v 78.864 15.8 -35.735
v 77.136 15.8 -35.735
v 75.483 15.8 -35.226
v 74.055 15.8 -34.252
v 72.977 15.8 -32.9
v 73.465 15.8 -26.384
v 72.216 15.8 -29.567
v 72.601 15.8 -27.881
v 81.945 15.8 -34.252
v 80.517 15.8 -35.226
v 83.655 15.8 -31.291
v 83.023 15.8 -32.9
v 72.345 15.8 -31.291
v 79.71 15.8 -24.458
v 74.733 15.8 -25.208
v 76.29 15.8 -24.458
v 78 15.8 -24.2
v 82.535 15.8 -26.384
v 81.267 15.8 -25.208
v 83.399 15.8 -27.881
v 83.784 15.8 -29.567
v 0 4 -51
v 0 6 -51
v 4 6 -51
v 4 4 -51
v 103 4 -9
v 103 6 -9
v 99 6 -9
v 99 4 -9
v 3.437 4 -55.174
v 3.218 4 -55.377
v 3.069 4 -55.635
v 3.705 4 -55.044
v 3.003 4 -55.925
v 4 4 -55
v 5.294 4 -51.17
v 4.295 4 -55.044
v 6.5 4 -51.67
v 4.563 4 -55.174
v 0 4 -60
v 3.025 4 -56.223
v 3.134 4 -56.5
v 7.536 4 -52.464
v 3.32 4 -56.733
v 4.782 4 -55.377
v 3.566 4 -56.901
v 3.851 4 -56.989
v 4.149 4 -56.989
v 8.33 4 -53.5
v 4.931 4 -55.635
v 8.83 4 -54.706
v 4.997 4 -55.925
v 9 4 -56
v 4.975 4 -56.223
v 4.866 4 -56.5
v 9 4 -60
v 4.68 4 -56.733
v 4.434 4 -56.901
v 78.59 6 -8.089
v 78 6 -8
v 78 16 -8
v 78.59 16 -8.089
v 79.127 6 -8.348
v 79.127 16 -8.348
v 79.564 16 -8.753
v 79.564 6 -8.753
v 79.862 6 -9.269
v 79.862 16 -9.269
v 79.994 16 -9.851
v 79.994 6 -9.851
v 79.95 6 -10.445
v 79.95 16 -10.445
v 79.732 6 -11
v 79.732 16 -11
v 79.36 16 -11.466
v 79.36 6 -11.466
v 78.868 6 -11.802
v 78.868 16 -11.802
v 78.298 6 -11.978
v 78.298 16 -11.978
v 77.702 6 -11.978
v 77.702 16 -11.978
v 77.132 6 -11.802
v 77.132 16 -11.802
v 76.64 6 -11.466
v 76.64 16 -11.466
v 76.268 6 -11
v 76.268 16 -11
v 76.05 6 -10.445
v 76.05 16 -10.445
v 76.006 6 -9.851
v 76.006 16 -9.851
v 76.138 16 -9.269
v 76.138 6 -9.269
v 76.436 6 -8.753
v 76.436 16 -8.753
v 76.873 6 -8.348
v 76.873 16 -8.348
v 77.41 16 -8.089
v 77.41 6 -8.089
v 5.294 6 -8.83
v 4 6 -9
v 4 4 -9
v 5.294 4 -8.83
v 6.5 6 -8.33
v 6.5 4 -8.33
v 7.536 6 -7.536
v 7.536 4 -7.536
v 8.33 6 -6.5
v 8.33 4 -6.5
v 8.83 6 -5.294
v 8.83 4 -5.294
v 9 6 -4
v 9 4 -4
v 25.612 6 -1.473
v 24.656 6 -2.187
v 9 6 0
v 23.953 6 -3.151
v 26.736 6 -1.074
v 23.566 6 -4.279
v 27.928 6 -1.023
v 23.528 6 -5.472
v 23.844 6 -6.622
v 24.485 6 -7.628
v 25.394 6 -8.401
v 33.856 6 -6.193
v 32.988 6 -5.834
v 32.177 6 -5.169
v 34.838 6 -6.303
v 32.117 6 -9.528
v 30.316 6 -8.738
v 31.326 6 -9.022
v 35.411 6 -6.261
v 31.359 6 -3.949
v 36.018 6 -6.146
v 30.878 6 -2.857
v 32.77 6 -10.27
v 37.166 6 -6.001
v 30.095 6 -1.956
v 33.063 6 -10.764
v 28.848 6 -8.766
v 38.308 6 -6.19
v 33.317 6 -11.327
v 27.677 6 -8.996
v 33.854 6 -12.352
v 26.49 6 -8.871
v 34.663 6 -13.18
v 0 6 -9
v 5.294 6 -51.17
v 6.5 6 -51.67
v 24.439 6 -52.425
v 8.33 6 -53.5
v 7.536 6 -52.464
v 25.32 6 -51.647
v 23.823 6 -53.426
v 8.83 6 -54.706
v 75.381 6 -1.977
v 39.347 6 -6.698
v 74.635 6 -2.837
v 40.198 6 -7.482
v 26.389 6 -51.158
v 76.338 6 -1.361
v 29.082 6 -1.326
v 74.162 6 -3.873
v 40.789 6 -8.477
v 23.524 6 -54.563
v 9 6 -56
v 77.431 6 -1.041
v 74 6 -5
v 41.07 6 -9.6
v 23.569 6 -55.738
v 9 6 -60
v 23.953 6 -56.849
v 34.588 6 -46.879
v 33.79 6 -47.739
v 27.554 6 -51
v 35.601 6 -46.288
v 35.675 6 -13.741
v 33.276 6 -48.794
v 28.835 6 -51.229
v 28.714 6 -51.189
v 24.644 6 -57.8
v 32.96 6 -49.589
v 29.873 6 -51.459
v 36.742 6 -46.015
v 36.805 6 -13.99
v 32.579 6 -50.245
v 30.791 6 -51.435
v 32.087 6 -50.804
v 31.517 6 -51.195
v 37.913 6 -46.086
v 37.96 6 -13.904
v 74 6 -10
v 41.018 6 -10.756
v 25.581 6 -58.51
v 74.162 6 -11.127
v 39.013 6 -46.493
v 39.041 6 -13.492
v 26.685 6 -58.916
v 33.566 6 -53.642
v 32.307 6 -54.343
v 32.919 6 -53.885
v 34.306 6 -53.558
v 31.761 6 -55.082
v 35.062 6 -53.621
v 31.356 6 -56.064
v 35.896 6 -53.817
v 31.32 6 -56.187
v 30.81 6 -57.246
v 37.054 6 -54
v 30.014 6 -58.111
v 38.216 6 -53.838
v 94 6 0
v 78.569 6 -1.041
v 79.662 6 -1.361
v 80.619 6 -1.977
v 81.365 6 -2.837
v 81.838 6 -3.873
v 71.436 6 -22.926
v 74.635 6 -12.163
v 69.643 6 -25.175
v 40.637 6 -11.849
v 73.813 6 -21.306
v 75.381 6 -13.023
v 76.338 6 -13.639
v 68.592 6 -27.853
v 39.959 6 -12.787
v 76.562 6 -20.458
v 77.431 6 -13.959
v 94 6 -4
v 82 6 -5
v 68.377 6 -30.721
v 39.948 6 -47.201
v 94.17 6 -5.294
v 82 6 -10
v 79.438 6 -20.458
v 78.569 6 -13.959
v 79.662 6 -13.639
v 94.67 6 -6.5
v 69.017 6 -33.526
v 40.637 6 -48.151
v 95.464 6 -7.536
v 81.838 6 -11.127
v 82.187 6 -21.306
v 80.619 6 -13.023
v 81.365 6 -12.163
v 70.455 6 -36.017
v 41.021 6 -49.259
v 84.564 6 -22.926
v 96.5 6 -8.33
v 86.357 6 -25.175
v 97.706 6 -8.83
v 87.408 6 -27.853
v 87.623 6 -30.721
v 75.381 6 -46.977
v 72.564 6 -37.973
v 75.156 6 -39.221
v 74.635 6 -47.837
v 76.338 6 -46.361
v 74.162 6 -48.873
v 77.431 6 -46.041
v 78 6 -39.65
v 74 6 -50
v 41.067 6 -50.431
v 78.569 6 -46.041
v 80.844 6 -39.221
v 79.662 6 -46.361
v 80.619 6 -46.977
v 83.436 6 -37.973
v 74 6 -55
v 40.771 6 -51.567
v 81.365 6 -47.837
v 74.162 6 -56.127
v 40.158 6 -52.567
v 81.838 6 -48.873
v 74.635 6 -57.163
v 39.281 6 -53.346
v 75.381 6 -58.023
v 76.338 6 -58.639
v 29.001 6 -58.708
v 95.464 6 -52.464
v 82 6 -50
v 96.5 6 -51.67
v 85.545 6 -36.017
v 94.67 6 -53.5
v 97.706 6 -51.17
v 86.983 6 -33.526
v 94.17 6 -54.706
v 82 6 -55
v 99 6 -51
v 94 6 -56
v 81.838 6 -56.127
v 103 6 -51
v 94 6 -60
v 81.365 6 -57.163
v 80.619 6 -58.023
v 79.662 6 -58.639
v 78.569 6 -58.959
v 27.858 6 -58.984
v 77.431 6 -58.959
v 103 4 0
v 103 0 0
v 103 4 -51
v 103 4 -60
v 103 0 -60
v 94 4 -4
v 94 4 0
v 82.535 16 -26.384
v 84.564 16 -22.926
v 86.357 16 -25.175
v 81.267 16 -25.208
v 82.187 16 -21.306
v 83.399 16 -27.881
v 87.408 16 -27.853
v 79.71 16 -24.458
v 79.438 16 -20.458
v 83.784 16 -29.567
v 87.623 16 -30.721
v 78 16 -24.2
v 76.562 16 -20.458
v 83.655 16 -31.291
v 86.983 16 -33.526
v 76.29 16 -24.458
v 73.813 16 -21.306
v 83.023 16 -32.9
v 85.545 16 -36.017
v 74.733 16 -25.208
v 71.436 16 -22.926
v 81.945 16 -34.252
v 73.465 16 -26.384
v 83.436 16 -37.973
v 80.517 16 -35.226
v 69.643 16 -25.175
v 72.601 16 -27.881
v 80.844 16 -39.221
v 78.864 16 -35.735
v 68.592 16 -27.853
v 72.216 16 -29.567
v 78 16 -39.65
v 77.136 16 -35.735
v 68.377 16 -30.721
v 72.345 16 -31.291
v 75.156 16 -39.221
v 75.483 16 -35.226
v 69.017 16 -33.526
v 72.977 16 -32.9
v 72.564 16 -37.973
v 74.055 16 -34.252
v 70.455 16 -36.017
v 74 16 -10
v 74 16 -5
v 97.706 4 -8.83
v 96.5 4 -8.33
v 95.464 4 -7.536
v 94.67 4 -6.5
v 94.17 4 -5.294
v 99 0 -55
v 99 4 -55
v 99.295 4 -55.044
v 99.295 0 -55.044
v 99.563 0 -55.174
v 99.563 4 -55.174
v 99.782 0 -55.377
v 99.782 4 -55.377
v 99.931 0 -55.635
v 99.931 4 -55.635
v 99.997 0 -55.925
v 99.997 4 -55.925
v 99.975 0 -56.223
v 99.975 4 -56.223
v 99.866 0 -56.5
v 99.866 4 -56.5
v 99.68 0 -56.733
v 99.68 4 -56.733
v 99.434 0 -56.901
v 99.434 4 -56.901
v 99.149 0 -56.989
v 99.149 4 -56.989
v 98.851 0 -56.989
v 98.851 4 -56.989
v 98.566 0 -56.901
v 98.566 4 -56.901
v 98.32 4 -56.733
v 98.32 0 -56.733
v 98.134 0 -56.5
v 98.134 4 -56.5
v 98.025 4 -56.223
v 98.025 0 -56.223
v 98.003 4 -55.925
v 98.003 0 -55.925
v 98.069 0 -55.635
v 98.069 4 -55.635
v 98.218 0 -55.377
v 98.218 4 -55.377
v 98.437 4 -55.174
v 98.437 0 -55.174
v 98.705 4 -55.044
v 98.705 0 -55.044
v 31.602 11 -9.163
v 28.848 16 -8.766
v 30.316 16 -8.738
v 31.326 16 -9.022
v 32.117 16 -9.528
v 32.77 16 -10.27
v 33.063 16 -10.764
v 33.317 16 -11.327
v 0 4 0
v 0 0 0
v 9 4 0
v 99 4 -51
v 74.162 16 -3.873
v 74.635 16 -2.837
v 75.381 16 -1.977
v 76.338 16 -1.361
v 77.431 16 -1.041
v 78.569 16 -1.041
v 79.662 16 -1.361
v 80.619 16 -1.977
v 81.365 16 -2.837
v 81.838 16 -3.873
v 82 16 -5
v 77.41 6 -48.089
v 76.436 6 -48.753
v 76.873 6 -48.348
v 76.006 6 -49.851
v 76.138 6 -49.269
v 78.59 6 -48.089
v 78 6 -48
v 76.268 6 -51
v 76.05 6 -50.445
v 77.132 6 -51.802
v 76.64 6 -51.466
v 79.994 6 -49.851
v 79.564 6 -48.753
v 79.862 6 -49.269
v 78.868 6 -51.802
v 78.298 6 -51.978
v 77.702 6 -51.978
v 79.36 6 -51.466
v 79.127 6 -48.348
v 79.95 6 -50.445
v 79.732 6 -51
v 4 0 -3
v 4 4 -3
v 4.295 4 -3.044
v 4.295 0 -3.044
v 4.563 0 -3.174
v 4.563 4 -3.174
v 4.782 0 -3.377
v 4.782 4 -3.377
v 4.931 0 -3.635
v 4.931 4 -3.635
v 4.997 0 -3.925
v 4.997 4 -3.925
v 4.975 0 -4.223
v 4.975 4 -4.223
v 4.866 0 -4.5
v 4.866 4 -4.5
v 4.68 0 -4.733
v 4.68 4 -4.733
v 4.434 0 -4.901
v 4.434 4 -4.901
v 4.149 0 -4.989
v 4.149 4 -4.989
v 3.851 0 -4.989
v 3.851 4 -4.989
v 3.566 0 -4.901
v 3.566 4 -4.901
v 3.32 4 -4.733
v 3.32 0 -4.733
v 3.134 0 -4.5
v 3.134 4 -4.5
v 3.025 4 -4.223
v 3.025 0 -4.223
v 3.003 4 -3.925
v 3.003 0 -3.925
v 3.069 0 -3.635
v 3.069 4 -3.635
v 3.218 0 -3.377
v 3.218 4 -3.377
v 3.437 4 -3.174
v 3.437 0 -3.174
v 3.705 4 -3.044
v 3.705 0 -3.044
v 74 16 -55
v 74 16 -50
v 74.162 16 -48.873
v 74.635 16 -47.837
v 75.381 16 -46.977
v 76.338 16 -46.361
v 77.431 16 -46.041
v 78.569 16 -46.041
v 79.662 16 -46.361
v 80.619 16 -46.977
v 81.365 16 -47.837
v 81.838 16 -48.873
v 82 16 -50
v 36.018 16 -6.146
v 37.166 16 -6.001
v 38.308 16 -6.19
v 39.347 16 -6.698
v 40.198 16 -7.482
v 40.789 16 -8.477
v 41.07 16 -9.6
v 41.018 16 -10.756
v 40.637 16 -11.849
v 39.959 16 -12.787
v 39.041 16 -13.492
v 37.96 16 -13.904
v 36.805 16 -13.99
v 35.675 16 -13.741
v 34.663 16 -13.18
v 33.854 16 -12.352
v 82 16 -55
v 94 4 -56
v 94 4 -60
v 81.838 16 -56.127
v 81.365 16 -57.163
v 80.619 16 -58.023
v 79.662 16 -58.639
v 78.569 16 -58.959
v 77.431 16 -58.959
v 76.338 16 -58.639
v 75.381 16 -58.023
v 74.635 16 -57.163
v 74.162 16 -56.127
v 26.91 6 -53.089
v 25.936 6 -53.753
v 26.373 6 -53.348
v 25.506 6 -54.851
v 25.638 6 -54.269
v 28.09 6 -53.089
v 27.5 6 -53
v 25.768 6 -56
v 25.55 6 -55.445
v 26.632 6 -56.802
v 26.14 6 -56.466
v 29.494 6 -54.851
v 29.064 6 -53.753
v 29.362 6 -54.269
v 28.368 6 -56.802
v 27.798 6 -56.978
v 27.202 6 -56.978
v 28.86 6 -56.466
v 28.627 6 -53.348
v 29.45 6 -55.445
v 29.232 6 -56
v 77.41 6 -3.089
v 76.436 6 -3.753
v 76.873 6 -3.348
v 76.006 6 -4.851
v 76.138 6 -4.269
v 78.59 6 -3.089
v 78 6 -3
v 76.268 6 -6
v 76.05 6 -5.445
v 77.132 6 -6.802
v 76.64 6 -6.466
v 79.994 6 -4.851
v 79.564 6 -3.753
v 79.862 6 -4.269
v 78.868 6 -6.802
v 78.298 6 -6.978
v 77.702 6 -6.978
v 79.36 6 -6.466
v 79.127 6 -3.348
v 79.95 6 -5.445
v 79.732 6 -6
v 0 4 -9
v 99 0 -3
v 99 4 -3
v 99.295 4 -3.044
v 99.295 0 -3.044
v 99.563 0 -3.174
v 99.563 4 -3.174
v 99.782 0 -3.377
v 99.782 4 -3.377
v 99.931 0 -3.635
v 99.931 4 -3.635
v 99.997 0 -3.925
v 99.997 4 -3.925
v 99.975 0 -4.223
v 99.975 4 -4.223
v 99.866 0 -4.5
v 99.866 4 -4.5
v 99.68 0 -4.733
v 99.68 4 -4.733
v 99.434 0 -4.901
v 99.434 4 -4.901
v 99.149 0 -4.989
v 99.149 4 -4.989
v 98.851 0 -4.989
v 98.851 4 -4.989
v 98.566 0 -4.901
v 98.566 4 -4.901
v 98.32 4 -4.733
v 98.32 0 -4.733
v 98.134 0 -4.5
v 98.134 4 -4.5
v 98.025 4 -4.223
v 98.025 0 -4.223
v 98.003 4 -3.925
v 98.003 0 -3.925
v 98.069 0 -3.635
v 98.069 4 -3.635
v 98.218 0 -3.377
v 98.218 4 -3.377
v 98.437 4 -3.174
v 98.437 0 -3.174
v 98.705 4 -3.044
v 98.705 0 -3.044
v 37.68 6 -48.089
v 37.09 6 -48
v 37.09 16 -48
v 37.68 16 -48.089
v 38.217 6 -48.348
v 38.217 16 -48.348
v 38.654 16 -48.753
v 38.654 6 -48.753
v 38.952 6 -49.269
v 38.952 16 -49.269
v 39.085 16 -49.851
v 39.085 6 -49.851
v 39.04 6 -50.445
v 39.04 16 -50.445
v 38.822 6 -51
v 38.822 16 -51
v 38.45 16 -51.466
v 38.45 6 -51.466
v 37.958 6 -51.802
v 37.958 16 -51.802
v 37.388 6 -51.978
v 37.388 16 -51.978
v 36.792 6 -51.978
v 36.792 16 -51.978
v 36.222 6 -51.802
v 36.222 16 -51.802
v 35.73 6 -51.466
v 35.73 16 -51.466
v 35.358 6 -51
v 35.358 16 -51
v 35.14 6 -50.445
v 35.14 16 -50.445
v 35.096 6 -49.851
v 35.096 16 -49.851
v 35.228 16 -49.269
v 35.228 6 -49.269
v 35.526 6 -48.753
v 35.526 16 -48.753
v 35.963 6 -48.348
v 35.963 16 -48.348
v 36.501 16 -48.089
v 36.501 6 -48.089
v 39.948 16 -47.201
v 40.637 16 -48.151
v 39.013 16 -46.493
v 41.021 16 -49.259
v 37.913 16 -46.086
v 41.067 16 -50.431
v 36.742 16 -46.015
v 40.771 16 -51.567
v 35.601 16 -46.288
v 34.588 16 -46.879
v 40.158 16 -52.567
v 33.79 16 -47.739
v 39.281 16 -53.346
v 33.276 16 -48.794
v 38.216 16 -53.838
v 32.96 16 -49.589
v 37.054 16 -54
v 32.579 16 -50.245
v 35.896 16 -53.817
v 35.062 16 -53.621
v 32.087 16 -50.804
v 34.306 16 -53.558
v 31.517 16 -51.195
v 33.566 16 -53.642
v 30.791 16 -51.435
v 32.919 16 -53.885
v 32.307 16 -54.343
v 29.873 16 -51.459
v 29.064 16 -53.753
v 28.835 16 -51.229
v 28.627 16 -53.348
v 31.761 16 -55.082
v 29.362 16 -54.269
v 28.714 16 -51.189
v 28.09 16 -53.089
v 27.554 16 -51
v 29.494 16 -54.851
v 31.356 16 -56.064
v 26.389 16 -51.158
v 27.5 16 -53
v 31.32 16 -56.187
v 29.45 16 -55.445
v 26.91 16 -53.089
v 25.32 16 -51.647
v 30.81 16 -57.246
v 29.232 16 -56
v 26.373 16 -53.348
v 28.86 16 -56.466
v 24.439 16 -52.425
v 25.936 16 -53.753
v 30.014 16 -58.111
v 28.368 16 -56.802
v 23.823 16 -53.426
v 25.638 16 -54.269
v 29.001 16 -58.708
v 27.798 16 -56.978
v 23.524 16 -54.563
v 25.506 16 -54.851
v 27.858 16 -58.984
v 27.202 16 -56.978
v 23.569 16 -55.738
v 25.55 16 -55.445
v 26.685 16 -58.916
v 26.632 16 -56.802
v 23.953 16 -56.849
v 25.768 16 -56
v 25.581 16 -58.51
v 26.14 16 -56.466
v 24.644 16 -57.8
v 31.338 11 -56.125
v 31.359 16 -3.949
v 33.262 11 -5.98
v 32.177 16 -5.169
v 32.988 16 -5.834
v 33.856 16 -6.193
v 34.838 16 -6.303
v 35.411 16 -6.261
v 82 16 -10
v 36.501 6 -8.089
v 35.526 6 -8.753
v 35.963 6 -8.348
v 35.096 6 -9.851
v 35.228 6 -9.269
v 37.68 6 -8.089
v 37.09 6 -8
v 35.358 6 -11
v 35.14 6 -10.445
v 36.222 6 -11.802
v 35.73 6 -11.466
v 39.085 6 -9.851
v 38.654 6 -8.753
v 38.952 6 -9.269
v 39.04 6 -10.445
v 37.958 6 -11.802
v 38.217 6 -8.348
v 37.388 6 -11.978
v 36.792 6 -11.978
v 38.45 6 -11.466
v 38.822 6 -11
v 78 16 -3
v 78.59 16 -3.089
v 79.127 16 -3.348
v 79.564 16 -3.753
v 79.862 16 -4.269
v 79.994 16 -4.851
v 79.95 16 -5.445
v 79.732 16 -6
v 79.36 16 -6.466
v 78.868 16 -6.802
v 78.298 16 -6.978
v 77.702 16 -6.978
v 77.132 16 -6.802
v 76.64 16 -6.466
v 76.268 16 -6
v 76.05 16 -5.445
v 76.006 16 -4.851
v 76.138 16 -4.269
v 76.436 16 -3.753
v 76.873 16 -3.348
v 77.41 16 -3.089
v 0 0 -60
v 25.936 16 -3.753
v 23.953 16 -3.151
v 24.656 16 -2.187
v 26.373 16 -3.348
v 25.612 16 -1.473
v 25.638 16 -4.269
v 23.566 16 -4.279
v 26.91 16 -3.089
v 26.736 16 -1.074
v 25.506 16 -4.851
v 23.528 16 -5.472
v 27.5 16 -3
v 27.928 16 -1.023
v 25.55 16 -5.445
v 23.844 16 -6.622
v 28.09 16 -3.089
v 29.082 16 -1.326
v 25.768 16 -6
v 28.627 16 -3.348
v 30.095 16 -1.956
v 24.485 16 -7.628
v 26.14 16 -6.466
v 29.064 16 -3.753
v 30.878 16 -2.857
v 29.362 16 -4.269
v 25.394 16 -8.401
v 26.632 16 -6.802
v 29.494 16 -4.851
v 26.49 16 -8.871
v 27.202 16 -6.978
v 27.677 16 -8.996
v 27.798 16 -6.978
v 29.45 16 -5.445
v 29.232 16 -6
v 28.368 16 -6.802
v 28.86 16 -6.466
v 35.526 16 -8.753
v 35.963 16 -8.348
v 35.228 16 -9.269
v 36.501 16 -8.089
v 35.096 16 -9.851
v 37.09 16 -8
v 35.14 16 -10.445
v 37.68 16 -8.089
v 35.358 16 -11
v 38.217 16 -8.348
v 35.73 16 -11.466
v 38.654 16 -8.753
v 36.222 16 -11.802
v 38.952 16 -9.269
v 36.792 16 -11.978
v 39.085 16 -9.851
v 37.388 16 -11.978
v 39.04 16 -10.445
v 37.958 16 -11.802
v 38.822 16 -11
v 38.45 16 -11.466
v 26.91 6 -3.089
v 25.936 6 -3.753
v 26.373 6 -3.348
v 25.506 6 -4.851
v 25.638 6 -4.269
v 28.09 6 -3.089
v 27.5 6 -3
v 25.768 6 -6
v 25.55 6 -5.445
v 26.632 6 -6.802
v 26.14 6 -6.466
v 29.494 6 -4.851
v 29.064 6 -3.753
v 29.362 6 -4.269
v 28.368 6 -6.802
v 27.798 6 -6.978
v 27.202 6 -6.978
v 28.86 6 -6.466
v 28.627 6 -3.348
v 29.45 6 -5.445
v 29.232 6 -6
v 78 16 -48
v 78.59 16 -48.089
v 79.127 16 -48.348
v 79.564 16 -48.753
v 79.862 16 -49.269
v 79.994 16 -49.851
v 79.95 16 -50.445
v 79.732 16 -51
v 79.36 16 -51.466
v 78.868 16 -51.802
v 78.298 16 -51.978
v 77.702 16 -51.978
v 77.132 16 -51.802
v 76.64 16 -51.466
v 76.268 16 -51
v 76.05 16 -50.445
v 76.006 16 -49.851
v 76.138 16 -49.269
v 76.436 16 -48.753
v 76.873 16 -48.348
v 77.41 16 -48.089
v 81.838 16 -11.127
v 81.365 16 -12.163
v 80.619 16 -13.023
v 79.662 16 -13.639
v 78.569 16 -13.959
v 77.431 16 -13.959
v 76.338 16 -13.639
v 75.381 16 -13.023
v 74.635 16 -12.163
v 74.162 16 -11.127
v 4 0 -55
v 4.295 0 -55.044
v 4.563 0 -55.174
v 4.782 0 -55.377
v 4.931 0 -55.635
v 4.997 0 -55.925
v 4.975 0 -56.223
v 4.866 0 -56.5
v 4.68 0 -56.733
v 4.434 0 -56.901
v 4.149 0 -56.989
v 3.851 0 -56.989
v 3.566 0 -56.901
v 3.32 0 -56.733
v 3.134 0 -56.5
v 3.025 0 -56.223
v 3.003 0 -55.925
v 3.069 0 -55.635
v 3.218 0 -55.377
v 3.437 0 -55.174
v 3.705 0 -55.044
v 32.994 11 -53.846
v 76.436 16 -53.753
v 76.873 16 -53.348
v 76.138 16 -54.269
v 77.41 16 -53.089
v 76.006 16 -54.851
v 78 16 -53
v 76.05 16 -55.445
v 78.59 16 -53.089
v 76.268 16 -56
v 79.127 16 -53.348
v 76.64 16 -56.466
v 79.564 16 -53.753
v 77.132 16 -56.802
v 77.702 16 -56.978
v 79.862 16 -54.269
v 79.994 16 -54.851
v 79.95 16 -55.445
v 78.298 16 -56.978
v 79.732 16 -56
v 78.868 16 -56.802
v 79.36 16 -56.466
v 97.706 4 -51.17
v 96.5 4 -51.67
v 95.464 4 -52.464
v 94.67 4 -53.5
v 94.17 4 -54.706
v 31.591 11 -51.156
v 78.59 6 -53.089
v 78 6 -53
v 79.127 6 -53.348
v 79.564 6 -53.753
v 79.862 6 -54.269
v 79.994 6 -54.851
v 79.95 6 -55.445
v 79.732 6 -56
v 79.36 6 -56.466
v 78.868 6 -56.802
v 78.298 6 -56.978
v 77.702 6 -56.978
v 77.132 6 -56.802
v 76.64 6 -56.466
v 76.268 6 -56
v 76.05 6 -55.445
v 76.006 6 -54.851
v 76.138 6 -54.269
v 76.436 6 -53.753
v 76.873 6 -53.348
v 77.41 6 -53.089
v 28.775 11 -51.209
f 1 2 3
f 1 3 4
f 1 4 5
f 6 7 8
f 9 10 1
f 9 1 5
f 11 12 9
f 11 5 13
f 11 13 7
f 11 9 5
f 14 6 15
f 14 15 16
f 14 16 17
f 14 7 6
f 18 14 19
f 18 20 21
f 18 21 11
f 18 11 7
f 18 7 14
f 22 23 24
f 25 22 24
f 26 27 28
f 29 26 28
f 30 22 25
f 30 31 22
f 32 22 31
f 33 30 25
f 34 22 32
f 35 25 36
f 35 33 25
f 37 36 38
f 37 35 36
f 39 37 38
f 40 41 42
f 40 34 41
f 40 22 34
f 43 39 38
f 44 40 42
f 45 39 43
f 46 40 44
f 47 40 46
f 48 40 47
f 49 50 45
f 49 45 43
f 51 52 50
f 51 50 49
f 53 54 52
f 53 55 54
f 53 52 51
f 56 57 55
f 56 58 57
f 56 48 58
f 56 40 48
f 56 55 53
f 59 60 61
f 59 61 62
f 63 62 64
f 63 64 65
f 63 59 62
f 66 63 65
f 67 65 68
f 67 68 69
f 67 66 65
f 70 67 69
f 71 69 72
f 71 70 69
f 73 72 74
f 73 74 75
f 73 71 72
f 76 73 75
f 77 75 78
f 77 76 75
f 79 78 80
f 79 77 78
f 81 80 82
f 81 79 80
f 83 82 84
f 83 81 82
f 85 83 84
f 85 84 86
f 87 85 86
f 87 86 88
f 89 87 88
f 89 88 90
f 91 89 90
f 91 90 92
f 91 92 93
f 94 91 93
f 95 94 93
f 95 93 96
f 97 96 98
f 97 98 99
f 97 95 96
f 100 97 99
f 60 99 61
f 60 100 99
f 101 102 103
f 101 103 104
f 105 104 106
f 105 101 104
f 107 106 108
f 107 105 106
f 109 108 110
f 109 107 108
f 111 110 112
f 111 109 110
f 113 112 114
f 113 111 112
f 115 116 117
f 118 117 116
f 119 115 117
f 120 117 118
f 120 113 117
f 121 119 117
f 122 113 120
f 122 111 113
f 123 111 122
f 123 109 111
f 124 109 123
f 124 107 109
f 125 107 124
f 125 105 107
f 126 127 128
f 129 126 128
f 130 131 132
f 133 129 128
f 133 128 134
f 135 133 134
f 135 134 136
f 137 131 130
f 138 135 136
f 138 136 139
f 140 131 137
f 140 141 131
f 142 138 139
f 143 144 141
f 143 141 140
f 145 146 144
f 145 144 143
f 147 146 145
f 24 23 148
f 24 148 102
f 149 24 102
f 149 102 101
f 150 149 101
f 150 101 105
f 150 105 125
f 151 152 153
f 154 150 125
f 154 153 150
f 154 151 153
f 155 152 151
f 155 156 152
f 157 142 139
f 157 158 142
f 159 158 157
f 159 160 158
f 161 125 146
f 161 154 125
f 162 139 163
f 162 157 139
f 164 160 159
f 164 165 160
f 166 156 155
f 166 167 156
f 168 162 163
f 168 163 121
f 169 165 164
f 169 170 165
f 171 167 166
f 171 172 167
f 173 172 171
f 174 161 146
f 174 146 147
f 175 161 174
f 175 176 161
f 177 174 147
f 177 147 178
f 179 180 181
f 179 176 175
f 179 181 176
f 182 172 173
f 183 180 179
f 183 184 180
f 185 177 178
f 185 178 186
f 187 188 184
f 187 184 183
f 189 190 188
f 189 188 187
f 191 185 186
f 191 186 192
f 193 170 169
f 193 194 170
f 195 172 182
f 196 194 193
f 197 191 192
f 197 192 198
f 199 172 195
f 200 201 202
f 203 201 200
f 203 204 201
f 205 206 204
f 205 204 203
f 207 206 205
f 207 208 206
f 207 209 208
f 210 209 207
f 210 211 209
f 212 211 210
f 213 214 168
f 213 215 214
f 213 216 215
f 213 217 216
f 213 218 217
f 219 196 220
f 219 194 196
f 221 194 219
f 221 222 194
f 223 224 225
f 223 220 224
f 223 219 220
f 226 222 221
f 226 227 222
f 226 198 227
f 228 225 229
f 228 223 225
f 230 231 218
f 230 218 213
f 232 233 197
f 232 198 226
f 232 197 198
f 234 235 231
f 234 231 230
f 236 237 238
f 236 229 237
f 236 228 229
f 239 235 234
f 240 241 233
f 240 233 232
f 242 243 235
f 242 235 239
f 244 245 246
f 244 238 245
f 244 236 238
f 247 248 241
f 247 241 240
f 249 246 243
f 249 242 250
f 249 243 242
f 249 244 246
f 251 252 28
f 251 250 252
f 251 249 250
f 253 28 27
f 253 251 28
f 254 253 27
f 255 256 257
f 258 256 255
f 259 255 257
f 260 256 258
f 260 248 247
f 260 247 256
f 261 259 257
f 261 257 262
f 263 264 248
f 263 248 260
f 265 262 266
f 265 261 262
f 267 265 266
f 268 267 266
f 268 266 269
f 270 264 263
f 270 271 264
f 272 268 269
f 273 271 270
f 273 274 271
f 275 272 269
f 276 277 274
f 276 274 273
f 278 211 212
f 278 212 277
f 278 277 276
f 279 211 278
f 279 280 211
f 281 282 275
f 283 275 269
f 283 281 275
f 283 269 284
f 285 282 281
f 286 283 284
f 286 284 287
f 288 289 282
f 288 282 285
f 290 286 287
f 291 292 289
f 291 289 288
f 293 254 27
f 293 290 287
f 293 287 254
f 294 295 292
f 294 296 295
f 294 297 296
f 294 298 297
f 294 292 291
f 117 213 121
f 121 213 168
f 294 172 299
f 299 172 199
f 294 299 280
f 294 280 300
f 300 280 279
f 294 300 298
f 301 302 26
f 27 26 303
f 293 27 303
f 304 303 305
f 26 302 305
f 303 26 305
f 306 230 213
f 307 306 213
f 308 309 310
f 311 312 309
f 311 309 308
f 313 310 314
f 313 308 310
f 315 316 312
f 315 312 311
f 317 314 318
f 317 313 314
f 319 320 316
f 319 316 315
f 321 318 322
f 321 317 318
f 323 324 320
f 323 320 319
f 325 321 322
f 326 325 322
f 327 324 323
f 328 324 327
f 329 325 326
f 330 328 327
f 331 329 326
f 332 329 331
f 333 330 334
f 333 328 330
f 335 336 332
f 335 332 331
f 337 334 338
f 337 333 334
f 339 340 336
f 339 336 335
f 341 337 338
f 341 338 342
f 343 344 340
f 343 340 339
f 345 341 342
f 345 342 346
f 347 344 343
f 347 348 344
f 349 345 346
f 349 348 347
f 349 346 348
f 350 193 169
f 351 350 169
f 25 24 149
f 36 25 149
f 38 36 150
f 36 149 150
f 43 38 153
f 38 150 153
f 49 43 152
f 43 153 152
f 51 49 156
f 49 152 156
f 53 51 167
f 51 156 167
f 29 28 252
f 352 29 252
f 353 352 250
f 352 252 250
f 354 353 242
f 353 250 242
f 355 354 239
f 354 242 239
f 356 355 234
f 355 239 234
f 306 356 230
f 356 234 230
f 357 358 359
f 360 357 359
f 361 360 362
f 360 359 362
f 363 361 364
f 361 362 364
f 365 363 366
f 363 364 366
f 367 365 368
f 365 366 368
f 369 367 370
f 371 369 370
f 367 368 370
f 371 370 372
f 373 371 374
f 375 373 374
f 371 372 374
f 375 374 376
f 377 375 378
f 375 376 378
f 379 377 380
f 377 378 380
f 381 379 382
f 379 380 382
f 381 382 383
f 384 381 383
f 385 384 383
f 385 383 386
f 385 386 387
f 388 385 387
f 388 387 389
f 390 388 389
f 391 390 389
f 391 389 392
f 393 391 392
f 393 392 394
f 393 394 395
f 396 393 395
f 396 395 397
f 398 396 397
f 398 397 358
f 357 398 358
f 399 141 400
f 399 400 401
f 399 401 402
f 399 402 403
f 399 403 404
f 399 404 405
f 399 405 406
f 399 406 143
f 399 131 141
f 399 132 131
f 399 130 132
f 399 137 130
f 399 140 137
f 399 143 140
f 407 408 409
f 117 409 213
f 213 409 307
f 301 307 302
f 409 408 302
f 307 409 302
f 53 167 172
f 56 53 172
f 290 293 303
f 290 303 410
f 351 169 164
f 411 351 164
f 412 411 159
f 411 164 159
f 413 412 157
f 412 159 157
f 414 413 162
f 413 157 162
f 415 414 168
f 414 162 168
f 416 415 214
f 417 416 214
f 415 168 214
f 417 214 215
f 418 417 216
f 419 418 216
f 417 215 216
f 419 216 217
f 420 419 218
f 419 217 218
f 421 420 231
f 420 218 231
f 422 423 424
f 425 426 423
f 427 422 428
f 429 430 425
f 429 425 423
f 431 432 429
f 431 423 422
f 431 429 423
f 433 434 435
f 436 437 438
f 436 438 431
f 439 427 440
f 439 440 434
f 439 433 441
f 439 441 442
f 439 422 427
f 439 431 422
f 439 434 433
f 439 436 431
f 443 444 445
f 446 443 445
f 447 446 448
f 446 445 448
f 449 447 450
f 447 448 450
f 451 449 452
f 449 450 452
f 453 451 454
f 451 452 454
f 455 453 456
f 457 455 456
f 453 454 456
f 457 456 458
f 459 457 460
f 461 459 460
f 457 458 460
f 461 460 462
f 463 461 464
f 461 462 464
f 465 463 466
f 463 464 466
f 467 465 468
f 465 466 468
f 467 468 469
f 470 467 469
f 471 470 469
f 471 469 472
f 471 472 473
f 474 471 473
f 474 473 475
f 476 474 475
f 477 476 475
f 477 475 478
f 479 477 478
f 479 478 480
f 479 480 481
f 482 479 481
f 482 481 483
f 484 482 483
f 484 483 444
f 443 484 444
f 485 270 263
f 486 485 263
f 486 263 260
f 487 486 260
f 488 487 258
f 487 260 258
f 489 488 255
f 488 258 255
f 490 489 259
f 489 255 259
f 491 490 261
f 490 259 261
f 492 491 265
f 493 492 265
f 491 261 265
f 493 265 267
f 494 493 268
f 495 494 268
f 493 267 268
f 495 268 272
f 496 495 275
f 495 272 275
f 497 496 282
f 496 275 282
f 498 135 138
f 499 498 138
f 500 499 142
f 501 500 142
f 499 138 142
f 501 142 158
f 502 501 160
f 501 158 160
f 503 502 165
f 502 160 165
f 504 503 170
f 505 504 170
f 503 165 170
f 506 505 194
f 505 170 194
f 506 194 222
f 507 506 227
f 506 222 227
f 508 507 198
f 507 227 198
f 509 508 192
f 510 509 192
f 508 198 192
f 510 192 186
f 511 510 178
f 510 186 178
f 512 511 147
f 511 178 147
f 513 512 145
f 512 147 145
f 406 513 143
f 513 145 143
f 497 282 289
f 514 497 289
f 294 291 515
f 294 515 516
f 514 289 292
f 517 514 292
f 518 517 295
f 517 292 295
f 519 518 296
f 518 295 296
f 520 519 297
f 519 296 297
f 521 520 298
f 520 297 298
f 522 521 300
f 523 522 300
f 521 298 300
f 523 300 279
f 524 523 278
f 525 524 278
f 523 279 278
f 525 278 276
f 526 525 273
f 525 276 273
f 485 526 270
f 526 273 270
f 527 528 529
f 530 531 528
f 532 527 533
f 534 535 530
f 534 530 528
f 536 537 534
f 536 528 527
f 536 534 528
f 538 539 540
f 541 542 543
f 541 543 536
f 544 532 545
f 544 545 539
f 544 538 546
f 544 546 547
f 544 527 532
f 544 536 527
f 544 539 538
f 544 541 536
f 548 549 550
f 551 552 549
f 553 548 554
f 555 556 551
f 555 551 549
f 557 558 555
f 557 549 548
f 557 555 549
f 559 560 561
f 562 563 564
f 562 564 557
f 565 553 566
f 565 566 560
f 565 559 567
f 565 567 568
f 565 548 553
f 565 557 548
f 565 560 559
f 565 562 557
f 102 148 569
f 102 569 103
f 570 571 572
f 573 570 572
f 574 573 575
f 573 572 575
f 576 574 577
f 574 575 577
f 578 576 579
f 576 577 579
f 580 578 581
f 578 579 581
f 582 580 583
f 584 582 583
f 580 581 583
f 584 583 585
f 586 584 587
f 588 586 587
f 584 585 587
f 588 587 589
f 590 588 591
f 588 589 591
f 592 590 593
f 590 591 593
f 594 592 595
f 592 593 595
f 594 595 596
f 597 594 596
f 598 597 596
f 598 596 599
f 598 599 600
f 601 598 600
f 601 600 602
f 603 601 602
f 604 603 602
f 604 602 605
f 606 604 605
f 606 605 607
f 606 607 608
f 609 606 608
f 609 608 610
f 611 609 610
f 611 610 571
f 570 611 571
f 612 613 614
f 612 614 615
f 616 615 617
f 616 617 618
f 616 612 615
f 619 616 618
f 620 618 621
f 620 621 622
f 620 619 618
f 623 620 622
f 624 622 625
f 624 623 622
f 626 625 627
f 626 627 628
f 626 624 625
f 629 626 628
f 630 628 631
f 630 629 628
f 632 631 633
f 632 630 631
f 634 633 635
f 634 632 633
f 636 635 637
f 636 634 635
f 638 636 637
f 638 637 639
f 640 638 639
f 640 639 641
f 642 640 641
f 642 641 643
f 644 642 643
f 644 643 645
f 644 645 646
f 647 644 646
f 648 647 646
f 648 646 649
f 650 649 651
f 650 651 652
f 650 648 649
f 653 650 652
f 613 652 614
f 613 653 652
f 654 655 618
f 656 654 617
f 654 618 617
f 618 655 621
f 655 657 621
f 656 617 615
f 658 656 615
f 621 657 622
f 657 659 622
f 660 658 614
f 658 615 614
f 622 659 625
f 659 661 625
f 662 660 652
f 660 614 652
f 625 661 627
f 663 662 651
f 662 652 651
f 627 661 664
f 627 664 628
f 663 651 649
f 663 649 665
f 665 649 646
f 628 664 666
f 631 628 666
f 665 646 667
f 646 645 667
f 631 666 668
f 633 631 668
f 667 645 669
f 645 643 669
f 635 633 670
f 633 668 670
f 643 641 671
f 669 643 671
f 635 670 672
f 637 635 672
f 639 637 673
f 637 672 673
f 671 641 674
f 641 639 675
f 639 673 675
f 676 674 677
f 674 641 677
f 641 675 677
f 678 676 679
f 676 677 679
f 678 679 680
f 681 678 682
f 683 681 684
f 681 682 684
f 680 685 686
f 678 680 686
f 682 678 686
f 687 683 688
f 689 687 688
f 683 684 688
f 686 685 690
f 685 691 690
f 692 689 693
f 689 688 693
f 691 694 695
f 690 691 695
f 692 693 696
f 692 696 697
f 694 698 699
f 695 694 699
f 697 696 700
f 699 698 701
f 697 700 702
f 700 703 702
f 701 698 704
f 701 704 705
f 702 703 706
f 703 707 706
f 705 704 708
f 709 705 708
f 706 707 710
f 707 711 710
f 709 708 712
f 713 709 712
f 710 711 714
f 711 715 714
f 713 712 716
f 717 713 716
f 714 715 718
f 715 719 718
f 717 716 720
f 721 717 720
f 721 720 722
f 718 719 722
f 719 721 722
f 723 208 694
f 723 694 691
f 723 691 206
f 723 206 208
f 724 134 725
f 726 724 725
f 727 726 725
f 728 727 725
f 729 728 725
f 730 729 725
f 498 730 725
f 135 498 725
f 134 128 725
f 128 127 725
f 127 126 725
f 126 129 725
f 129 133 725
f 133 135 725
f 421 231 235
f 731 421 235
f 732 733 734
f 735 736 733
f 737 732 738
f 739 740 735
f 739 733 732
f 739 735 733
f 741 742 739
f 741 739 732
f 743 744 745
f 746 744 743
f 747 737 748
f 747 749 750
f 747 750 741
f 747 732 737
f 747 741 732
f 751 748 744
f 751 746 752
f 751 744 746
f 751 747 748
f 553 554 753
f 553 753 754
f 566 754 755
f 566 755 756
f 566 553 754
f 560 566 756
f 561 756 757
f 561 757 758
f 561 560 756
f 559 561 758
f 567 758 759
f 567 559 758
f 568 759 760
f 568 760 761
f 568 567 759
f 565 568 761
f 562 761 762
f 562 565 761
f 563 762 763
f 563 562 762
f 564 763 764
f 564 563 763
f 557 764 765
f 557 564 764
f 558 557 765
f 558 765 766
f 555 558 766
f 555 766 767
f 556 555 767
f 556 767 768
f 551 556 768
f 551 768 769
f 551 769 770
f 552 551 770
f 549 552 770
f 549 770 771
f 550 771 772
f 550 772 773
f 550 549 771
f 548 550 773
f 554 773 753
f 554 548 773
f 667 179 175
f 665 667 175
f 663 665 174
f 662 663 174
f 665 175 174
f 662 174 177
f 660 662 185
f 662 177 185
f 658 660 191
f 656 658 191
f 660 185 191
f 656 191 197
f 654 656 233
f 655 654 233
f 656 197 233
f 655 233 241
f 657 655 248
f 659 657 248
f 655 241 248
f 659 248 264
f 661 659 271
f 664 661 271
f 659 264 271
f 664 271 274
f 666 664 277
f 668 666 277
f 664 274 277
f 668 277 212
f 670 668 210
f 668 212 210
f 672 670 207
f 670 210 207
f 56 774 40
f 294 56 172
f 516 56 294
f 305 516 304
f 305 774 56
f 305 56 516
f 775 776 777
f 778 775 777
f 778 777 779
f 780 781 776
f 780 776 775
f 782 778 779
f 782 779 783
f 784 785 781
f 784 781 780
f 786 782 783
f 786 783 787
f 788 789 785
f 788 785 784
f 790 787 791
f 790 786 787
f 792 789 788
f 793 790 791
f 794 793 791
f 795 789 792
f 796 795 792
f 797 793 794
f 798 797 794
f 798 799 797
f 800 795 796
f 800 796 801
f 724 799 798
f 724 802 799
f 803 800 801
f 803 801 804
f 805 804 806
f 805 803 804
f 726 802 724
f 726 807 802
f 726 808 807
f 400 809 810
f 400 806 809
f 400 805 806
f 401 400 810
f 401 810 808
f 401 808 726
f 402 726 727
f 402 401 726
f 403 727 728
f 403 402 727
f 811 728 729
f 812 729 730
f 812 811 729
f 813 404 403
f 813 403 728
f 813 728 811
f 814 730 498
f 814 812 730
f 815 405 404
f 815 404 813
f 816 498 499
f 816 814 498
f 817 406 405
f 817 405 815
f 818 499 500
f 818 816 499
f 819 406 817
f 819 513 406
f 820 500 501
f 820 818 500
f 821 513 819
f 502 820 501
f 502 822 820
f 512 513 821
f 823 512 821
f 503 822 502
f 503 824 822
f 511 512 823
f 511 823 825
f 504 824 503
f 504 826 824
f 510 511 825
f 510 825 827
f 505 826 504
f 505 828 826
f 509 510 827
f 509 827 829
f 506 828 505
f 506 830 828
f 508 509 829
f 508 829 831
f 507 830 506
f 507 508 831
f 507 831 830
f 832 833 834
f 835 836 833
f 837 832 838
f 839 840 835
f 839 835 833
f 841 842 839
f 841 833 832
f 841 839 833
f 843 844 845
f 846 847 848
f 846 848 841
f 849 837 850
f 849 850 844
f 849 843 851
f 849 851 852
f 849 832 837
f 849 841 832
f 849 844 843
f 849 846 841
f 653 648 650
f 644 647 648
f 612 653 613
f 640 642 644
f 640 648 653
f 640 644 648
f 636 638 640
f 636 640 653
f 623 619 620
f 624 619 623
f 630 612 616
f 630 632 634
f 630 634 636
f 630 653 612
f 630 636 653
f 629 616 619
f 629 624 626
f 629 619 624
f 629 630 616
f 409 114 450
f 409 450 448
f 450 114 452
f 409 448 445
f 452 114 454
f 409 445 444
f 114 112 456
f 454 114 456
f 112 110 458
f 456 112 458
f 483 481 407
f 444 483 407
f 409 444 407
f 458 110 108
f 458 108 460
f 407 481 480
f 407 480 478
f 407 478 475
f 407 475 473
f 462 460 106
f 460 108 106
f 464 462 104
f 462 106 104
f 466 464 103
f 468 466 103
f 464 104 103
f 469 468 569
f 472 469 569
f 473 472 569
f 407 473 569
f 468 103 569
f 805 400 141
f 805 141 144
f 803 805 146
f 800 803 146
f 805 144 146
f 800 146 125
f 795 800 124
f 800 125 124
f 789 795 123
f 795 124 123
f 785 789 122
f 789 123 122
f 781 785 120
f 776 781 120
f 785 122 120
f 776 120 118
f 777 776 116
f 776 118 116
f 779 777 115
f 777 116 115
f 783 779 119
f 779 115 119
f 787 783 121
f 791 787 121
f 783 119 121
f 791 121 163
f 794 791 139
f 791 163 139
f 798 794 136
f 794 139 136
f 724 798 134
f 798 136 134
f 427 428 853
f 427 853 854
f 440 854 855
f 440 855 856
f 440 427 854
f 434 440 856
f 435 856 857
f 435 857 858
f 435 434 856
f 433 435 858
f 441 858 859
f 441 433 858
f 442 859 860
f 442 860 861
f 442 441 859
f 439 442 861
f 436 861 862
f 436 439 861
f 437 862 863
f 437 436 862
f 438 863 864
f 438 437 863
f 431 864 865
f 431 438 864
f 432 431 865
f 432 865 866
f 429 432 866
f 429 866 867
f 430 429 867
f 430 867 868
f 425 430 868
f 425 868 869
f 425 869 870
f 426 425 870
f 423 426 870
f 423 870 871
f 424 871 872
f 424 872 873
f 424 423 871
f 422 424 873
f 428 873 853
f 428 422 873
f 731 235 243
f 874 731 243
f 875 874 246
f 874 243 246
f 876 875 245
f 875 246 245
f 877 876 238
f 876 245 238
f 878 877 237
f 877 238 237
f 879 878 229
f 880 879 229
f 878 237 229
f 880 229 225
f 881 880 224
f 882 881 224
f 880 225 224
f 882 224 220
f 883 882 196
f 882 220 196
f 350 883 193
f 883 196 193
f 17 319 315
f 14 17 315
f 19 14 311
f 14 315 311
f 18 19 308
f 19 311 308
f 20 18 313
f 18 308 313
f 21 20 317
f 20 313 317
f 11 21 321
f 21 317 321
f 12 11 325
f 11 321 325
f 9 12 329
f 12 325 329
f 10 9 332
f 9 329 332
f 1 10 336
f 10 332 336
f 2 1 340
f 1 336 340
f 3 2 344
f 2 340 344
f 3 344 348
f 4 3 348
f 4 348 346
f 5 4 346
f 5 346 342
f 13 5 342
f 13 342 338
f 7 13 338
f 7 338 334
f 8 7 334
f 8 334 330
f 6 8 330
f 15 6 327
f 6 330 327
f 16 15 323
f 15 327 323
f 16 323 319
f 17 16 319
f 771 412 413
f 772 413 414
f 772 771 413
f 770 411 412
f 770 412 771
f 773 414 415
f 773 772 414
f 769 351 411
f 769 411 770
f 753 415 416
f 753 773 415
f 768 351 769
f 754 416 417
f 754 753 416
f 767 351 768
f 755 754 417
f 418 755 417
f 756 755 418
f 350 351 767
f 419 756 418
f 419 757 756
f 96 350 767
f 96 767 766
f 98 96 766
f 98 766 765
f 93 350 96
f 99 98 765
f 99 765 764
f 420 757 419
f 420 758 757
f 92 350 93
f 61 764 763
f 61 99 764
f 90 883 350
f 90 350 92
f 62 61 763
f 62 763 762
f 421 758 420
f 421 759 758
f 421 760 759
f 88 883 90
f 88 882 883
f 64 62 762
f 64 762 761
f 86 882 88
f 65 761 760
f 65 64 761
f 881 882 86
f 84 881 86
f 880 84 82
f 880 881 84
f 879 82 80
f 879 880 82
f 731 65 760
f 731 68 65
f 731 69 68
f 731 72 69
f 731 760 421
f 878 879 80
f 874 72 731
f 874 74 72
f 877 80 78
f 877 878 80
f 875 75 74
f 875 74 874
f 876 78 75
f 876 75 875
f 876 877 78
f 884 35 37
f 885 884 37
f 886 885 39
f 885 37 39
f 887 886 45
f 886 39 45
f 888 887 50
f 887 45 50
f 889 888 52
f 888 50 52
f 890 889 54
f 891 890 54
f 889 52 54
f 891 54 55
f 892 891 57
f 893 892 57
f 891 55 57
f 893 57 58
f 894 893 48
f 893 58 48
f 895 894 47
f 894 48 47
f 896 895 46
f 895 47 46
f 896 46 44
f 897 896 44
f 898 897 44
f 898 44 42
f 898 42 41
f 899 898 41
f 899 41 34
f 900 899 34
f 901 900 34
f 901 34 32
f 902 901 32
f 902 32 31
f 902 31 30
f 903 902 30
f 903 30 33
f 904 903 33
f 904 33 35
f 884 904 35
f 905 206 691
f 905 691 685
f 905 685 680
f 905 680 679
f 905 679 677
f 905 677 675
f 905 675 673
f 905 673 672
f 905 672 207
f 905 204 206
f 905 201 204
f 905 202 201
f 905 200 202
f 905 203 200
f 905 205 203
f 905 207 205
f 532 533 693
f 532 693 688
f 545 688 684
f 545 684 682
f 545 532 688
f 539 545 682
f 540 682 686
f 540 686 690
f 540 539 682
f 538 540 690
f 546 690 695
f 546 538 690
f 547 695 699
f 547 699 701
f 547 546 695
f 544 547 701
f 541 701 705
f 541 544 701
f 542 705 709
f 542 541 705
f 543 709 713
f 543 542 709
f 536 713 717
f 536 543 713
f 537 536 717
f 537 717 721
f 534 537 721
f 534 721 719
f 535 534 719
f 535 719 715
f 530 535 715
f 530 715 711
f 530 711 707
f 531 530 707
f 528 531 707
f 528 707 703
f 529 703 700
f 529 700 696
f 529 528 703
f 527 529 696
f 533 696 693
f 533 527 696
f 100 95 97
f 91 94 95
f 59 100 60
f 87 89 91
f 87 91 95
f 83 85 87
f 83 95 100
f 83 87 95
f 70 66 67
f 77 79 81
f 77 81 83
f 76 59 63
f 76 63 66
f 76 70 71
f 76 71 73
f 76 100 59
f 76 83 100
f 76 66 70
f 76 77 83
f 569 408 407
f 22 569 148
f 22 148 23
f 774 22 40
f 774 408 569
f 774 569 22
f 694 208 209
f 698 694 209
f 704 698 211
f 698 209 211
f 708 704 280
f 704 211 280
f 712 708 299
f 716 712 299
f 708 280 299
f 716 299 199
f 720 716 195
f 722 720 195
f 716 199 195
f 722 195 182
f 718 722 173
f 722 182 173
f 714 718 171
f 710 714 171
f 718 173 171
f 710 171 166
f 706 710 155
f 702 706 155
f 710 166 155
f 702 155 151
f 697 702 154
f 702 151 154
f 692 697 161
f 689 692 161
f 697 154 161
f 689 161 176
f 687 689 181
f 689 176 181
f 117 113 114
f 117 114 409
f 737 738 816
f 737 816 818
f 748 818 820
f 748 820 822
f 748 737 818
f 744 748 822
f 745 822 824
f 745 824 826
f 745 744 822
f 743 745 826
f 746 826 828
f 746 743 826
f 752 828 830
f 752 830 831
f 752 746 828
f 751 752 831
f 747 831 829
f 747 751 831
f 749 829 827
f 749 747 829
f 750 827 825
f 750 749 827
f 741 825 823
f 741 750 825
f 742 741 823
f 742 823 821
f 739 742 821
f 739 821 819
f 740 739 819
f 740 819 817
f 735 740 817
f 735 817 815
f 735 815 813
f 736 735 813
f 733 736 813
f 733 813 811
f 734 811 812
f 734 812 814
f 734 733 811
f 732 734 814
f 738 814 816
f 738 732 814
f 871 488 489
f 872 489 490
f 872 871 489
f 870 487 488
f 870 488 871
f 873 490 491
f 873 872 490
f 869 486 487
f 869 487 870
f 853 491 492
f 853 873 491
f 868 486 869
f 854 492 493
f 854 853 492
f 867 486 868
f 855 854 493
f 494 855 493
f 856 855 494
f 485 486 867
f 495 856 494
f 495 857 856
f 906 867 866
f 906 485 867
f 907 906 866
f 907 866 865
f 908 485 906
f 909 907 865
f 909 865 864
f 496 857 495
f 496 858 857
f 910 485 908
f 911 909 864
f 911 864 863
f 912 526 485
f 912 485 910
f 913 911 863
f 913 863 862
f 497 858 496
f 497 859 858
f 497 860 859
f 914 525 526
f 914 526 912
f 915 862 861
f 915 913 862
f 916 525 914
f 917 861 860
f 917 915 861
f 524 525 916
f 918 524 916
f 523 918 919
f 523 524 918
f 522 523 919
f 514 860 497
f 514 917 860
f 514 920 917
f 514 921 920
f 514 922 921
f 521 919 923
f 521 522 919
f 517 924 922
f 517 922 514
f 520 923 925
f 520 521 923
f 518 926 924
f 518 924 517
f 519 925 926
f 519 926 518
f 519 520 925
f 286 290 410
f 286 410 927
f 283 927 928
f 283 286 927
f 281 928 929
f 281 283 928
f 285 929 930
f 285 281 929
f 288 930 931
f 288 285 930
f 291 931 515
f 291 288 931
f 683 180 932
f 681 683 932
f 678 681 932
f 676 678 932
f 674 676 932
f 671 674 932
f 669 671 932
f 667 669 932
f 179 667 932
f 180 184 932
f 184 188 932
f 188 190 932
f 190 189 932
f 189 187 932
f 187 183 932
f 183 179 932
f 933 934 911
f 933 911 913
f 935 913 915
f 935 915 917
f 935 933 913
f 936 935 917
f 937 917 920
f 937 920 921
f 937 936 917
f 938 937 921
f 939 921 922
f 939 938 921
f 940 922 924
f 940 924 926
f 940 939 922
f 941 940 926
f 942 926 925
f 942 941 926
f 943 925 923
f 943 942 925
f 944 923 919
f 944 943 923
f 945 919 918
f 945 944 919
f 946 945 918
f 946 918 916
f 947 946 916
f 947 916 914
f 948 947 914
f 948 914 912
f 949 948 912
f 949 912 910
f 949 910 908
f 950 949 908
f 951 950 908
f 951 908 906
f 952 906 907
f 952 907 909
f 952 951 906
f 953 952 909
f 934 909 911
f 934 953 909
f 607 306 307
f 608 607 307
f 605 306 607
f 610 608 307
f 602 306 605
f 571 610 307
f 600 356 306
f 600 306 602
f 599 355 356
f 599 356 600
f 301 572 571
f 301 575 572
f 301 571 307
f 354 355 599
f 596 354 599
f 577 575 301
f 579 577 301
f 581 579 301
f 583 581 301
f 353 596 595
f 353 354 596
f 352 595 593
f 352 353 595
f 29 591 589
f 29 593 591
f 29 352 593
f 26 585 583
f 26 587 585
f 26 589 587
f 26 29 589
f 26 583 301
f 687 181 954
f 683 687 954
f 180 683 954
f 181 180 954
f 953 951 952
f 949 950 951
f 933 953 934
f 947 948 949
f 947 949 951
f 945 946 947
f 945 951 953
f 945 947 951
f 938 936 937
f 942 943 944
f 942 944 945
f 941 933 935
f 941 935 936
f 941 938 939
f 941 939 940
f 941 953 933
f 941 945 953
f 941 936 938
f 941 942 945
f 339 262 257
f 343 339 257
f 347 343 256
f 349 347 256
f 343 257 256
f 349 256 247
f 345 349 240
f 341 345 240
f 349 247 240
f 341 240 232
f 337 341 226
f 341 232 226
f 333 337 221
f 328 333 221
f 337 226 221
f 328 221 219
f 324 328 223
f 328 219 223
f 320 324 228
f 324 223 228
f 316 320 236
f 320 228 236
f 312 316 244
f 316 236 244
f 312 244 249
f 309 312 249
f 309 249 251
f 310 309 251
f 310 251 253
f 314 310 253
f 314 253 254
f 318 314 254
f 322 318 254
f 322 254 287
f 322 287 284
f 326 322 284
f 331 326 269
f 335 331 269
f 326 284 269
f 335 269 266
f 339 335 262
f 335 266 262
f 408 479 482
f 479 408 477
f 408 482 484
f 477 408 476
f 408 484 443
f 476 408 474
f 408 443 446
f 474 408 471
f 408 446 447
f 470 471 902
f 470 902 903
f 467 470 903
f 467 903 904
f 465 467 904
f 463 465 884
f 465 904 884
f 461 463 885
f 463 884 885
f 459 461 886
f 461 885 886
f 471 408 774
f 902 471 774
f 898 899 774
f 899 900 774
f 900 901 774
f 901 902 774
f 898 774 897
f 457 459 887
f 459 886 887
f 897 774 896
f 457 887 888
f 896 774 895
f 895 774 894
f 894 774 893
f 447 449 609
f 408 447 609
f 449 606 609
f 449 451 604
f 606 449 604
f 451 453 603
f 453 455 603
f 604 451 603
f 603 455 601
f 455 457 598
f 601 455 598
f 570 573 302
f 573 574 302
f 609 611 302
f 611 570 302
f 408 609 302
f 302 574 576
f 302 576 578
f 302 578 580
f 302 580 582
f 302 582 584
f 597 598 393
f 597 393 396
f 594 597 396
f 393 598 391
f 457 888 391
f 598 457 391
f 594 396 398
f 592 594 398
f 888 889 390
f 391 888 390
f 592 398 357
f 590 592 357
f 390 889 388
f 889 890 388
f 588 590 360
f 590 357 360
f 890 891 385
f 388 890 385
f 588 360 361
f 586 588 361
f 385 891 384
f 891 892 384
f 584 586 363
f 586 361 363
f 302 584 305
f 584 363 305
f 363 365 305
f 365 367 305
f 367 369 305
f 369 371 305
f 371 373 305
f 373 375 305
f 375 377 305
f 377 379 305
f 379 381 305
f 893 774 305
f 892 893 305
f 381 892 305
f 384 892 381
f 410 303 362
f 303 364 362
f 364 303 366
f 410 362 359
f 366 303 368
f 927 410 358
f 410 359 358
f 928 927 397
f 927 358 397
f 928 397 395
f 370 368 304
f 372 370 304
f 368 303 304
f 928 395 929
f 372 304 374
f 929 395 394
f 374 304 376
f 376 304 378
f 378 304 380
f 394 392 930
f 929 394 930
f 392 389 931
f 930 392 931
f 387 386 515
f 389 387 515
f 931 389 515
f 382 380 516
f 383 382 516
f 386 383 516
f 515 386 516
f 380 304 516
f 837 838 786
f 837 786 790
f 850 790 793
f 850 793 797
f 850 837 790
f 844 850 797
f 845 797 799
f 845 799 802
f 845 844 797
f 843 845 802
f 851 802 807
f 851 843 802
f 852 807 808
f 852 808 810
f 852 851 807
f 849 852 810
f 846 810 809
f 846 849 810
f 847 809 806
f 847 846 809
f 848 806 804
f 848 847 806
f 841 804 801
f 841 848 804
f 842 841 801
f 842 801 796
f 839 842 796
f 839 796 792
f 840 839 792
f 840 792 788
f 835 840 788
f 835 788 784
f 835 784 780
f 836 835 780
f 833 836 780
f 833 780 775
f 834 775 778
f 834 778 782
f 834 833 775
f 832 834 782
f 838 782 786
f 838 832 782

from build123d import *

# Parameters (mm, degrees)
SKETCH2_W           = 103
SKETCH2_H           = 60
BOSS_EXTRUDE1_DEPTH = 6
SKETCH3_R           = 9.65
SKETCH3_R_2         = 2
BOSS_EXTRUDE2_DEPTH = 10
CUT_EXTRUDE1_DEPTH  = 2
SKETCH6_R           = 1
CUT_EXTRUDE2_DEPTH  = 120.804006757
SKETCH7_R           = 5.8
CUT_EXTRUDE3_DEPTH  = 0.2


with BuildPart() as part:
    # Sketch2 → Boss-Extrude1 (new body)
    with BuildSketch(Plane(origin=(0, 0, 0), x_dir=(1, 0, 0), z_dir=(0, 1, 0))):
        with Locations((51.5, 30)):
            Rectangle(SKETCH2_W, SKETCH2_H)
    extrude(amount=BOSS_EXTRUDE1_DEPTH)

    # Sketch3 → Boss-Extrude2 (add)
    # profile 1 of 5: a face of its own
    with BuildSketch(Plane(origin=(0, 6, 0), x_dir=(1, 0, 0), z_dir=(0, 1, 0))):
        with Locations(Location((78, 30, 0), (0, 0, 90))):
            Circle(SKETCH3_R)
    # profile 2 of 5: a face of its own
    with BuildSketch(Plane(origin=(0, 6, 0), x_dir=(1, 0, 0), z_dir=(0, 1, 0))):
        with BuildLine():
            Line((74, 55), (74, 50))
            ThreePointArc((74, 50), (78, 46), (82, 50))
            Line((82, 50), (82, 55))
            ThreePointArc((82, 55), (78, 59), (74, 55))
        make_face()
        with Locations(Location((78, 55, 0), (0, 0, 270))):
            Circle(SKETCH3_R_2, mode=Mode.SUBTRACT)
        with Locations(Location((78, 50, 0), (0, 0, 270))):
            Circle(SKETCH3_R_2, mode=Mode.SUBTRACT)
    # profile 3 of 5: a face of its own
    with BuildSketch(Plane(origin=(0, 6, 0), x_dir=(1, 0, 0), z_dir=(0, 1, 0))):
        with BuildLine():
            Line((74, 10), (74, 5))
            ThreePointArc((74, 5), (78, 1), (82, 5))
            Line((82, 5), (82, 10))
            ThreePointArc((82, 10), (78, 14), (74, 10))
        make_face()
        with Locations(Location((78, 10, 0), (0, 0, 270))):
            Circle(SKETCH3_R_2, mode=Mode.SUBTRACT)
        with Locations(Location((78, 5, 0), (0, 0, 270))):
            Circle(SKETCH3_R_2, mode=Mode.SUBTRACT)
    # profile 4 of 5: a face of its own
    with BuildSketch(Plane(origin=(0, 6, 0), x_dir=(1, 0, 0), z_dir=(0, 1, 0))):
        with BuildLine():
            ThreePointArc((28.84758707, 8.766166365), (23.953123955, 3.150764937), (31.359338334, 3.948568773))
            add(Edge.make_bspline(
                [(31.359338334, 3.948568773), (32.83524335, 6.912030452), (36.017562261, 6.146478651)],
                knots=[0, 0, 0, 1, 1, 1], degree=2))
            ThreePointArc((36.017562261, 6.146478651), (40.636992833, 11.849235063), (33.316625669, 11.326938122))
            add(Edge.make_bspline(
                [(28.84758707, 8.766166365), (32.122274454, 8.279521447), (33.316625669, 11.326938122)],
                knots=[0, 0, 0, 1, 1, 1], degree=2))
        make_face()
        with Locations(Location((37.090116788, 10, 0), (0, 0, 270))):
            Circle(SKETCH3_R_2, mode=Mode.SUBTRACT)
        with Locations(Location((27.5, 5, 0), (0, 0, 270))):
            Circle(SKETCH3_R_2, mode=Mode.SUBTRACT)
    # profile 5 of 5: a face of its own
    with BuildSketch(Plane(origin=(0, 6, 0), x_dir=(1, 0, 0), z_dir=(0, 1, 0))):
        with BuildLine():
            add(Edge.make_bspline(
                [(31.355779837, 56.064406805), (32.362019475, 52.752034899), (35.895571064, 53.817467814)],
                knots=[0.017920477, 0.017920477, 0.017920477, 1, 1, 1], degree=2))
            add(Edge.make_bspline(
                [(31.319898681, 56.18674937), (31.337418499, 56.124849248), (31.355779837, 56.064406805)],
                knots=[0, 0, 0, 0.017920477, 0.017920477, 0.017920477], degree=2))
            ThreePointArc((31.319898681, 56.18674937), (23.953123955, 56.849235063), (28.714062153, 51.188694044))
            add(Edge.make_bspline(
                [(28.714062153, 51.188694044), (28.774843392, 51.209770338), (28.83491132, 51.229322108)],
                knots=[0, 0, 0, 0.017920477, 0.017920477, 0.017920477], degree=2))
            add(Edge.make_bspline(
                [(28.83491132, 51.229322108), (32.126759022, 52.300799854), (33.276340108, 48.793721661)],
                knots=[0.017920477, 0.017920477, 0.017920477, 1, 1, 1], degree=2))
            ThreePointArc((33.276340108, 48.793721661), (40.636992833, 48.150764937), (35.895571064, 53.817467814))
        make_face()
        with Locations(Location((37.090116788, 50, 0), (0, 0, 270))):
            Circle(SKETCH3_R_2, mode=Mode.SUBTRACT)
        with Locations(Location((27.5, 55, 0), (0, 0, 270))):
            Circle(SKETCH3_R_2, mode=Mode.SUBTRACT)
    extrude(amount=BOSS_EXTRUDE2_DEPTH)

    # Sketch5 → Cut-Extrude1 (cut)
    with BuildSketch(Plane(origin=(0, 6, 0), x_dir=(1, 0, 0), z_dir=(0, 1, 0))):
        with BuildLine():
            Line((9, 0), (0, 0))
            Line((0, 0), (0, 9))
            Line((0, 9), (4, 9))
            ThreePointArc((4, 9), (7.535533906, 7.535533906), (9, 4))
            Line((9, 4), (9, 0))
        make_face()
        with BuildLine():
            Line((0, 60), (0, 51))
            Line((0, 51), (4, 51))
            ThreePointArc((4, 51), (7.535533906, 52.464466094), (9, 56))
            Line((9, 56), (9, 60))
            Line((9, 60), (0, 60))
        make_face()
        with BuildLine():
            Line((94, 60), (103, 60))
            Line((103, 60), (103, 51))
            Line((103, 51), (99, 51))
            ThreePointArc((99, 51), (95.464466094, 52.464466094), (94, 56))
            Line((94, 56), (94, 60))
        make_face()
        with BuildLine():
            Line((103, 0), (103, 9))
            Line((103, 9), (99, 9))
            ThreePointArc((99, 9), (95.464466094, 7.535533906), (94, 4))
            Line((94, 4), (94, 0))
            Line((94, 0), (103, 0))
        make_face()
    extrude(amount=-CUT_EXTRUDE1_DEPTH, mode=Mode.SUBTRACT)

    # Sketch6 → Cut-Extrude2 (cut, through all)
    with BuildSketch(Plane(origin=(0, 4, 0), x_dir=(1, 0, 0), z_dir=(0, 1, 0))):
        with Locations(Location((4, 4, 0), (0, 0, 270))):
            Circle(SKETCH6_R)
        with Locations(Location((4, 56, 0), (0, 0, 270))):
            Circle(SKETCH6_R)
        with Locations(Location((99, 56, 0), (0, 0, 270))):
            Circle(SKETCH6_R)
        with Locations(Location((99, 4, 0), (0, 0, 270))):
            Circle(SKETCH6_R)
    extrude(amount=-CUT_EXTRUDE2_DEPTH, mode=Mode.SUBTRACT)

    # Sketch7 → Cut-Extrude3 (cut)
    with BuildSketch(Plane(origin=(0, 16, 0), x_dir=(1, 0, 0), z_dir=(0, 1, 0))):
        with Locations(Location((78, 30, 0), (0, 0, 270))):
            Circle(SKETCH7_R)
    extrude(amount=-CUT_EXTRUDE3_DEPTH, mode=Mode.SUBTRACT)


solid = part.part
